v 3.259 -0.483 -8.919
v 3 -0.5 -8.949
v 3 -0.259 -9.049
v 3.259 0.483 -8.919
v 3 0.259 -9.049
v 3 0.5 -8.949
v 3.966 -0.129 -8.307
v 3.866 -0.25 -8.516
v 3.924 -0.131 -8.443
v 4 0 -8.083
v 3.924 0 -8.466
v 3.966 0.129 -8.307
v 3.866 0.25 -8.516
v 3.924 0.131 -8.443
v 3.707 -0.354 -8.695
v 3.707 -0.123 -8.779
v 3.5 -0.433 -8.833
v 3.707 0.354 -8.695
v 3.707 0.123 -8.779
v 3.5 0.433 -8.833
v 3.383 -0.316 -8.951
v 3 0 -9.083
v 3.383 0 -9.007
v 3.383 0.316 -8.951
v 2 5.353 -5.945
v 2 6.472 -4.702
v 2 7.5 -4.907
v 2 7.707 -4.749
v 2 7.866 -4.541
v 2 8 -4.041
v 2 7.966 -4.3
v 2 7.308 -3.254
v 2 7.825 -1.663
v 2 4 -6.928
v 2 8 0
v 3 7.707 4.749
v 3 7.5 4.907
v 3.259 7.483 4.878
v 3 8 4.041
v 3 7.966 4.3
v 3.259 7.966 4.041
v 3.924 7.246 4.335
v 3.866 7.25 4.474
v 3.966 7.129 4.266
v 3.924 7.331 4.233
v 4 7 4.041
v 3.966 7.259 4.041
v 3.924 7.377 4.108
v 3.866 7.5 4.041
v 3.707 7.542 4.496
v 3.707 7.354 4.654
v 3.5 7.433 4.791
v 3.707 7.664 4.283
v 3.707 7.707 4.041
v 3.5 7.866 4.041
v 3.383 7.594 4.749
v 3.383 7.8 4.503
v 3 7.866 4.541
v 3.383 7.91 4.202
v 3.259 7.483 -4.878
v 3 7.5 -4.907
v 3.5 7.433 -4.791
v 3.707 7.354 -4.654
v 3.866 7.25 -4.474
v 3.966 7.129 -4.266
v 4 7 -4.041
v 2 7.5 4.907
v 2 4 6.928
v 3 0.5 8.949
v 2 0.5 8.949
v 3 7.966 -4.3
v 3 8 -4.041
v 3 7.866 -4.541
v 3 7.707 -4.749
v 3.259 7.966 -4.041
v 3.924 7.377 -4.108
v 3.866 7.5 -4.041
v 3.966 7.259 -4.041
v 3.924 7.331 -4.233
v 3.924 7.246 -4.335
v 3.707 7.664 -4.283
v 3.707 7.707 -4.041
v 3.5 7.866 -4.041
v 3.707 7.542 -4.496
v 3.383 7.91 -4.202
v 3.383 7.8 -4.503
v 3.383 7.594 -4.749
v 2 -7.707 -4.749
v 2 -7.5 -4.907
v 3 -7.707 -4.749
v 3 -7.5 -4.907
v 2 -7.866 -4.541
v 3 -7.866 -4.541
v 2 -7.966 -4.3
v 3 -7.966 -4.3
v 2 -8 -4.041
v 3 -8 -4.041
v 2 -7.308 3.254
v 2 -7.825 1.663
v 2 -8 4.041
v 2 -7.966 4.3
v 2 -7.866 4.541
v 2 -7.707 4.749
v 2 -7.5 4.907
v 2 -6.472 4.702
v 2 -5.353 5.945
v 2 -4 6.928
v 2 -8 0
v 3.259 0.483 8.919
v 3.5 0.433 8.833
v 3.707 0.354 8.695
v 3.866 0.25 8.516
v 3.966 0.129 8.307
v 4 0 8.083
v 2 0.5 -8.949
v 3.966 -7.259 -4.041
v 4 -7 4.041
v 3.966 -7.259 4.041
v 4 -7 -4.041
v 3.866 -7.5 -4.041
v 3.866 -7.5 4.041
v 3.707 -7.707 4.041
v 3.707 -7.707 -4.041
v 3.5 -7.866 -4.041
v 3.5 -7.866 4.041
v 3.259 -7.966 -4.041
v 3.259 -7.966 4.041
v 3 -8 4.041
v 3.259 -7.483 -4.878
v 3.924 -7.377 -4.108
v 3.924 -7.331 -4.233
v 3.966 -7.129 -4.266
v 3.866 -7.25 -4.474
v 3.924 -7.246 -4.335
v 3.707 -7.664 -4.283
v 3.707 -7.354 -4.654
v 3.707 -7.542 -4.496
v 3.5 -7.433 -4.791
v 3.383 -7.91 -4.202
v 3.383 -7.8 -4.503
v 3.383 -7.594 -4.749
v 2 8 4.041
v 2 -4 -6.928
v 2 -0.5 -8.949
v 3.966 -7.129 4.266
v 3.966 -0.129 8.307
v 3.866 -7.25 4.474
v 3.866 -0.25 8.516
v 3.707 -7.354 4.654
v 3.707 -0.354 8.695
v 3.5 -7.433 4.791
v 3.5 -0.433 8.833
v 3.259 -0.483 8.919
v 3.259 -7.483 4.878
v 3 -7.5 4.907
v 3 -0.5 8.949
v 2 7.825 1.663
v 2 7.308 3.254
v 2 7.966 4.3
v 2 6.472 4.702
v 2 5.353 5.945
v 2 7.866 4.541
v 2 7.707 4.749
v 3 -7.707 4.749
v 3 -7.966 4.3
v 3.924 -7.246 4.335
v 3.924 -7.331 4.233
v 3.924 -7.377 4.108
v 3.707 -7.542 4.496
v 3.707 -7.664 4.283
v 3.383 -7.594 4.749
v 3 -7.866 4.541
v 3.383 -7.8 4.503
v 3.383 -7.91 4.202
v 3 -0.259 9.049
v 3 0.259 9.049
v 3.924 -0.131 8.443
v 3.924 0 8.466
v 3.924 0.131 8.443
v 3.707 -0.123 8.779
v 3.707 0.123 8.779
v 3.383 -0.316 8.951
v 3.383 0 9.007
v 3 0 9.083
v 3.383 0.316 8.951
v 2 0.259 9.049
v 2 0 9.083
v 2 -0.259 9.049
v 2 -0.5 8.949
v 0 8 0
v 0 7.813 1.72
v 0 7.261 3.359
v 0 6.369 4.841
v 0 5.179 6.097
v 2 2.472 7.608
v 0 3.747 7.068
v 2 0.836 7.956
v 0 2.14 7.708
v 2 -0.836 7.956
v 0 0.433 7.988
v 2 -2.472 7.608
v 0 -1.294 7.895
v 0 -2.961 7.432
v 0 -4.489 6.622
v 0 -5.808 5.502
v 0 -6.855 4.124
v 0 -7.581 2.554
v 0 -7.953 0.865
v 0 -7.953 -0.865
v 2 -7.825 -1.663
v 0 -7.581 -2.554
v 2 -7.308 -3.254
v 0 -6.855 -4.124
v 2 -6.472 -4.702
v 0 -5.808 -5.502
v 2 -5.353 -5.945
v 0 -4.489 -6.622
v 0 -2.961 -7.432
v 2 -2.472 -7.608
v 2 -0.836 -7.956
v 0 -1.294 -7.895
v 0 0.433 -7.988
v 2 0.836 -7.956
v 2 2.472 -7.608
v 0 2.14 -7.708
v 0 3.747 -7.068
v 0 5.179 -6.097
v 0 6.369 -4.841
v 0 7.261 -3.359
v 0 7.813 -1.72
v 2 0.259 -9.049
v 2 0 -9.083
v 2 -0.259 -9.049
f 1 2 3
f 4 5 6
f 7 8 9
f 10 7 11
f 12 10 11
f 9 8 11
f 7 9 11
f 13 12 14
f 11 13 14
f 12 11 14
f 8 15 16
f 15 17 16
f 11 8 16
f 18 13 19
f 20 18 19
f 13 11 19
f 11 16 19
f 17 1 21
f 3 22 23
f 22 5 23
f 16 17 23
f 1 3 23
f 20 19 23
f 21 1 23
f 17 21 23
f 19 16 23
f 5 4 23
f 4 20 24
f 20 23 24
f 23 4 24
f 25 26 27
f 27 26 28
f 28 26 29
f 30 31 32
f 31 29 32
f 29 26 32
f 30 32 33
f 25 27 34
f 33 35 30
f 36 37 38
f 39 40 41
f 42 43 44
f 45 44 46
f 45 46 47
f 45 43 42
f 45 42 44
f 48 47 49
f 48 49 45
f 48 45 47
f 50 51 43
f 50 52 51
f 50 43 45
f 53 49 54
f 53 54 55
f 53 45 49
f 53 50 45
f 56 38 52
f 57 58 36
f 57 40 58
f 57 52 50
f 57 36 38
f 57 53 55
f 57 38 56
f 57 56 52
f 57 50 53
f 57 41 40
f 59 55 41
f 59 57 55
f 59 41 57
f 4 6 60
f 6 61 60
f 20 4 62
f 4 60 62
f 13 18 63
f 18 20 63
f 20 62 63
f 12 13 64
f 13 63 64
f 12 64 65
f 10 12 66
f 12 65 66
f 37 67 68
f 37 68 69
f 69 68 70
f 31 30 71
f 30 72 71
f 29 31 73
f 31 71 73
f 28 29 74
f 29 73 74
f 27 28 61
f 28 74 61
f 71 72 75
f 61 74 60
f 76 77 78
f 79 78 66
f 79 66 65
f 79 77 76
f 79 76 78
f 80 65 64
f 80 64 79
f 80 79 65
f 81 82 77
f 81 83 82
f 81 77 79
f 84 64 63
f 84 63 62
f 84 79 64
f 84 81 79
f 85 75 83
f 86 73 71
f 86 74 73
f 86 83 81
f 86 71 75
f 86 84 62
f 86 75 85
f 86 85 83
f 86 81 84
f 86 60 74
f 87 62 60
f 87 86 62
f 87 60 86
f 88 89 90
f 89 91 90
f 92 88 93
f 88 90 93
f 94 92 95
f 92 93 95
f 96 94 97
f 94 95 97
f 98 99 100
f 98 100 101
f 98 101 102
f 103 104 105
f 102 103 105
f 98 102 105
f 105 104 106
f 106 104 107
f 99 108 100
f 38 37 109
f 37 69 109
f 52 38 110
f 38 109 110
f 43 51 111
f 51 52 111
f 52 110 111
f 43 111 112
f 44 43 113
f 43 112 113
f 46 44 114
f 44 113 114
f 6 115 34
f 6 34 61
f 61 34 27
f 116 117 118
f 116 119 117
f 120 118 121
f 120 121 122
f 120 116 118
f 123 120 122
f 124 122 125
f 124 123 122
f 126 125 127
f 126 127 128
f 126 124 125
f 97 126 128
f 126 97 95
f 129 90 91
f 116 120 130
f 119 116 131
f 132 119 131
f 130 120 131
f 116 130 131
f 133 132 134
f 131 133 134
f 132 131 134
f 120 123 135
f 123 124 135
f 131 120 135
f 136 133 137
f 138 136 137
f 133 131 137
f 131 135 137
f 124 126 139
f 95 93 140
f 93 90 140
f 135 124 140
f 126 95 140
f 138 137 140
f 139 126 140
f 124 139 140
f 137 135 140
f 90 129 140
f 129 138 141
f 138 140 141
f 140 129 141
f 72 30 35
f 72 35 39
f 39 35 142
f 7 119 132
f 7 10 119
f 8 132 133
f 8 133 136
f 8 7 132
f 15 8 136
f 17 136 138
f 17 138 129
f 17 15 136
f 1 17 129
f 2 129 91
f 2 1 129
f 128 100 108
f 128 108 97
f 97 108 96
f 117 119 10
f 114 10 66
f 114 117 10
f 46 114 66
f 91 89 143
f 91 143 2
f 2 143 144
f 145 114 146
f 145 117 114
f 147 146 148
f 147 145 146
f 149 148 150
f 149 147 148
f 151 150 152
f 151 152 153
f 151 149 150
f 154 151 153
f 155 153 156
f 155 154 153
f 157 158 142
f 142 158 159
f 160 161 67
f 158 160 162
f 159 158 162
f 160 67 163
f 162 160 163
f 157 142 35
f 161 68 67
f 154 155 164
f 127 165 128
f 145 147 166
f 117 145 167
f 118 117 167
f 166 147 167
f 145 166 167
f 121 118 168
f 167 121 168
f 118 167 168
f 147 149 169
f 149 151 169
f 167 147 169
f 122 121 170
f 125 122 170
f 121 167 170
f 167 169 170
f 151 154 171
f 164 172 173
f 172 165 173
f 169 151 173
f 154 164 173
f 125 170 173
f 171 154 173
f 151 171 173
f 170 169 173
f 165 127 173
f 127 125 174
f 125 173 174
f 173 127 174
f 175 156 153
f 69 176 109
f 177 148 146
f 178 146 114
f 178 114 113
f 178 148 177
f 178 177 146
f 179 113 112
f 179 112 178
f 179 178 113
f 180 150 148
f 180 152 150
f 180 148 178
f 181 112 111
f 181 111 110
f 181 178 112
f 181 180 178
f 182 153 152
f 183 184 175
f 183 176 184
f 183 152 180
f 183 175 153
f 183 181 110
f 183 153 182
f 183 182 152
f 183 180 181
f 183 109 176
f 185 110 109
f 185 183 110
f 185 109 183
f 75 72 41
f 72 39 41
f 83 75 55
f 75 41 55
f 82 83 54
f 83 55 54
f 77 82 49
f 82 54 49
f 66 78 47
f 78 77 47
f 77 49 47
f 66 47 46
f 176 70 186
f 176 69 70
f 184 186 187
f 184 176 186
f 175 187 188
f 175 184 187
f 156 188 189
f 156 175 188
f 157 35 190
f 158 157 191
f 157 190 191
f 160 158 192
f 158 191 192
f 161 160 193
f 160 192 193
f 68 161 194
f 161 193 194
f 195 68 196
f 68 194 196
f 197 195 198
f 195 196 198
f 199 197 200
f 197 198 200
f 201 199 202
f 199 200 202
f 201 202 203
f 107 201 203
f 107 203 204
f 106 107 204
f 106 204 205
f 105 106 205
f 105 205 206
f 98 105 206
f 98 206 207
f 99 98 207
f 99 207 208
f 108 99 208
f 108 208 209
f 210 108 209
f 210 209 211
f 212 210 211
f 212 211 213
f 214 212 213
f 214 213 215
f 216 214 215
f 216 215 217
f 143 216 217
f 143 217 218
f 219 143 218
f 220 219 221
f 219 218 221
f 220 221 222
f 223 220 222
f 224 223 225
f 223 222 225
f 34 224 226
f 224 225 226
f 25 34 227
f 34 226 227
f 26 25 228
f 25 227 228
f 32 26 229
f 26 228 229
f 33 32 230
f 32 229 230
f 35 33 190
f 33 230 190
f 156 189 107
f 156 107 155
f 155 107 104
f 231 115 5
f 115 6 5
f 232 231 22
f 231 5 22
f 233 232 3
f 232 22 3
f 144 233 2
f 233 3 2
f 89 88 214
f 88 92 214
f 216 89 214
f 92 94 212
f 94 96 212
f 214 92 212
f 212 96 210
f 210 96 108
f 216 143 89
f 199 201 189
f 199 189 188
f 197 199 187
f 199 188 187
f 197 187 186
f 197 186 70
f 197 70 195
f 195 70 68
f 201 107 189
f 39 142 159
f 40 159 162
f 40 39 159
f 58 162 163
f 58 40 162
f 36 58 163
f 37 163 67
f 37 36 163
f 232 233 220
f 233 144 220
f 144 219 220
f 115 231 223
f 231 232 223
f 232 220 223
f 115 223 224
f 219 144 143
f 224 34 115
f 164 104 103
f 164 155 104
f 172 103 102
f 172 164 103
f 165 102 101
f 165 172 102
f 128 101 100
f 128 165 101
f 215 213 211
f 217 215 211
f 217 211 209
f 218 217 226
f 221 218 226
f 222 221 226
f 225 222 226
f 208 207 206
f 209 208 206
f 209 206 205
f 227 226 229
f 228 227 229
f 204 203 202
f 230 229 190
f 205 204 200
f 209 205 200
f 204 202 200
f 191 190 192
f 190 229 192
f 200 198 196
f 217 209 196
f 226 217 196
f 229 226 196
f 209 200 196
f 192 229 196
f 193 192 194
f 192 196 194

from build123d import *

# Parameters (mm, degrees)
F0_R     = 8
F1_DEPTH = 2
F3_DEPTH = 2
F4_R     = 1


with BuildPart() as f1:
    # F0 (on Right) → F1 (new body)
    with BuildSketch(Plane.YZ):
        Circle(F0_R)
    extrude(amount=F1_DEPTH)

    # F2 (on face) → F3 (join)
    with BuildSketch(Plane.YZ.offset(2)):
        Polygon((8, -4.618802), (8, 4.618802), (0, 9.237604), (-8, 4.618802), (-8, -4.618802), (0, -9.237604), align=None)
    extrude(amount=F3_DEPTH)

    # F4
    f4_edges = [f1.edges().sort_by_distance(p)[0] for p in [
        (3, 0, 9.237604),
        (3, 8, 4.618802),
        (3, 8, -4.618802),
        (3, -8, 4.618802),
        (3, -8, -4.618802),
        (3, 0, -9.237604),
        (4, -4, 6.928203),
        (4, -8, 0),
        (4, -4, -6.928203),
        (4, 4, 6.928203),
        (4, 8, 0),
        (4, 4, -6.928203),
    ]]
    fillet(f4_edges, radius=F4_R)


solid = f1.part
